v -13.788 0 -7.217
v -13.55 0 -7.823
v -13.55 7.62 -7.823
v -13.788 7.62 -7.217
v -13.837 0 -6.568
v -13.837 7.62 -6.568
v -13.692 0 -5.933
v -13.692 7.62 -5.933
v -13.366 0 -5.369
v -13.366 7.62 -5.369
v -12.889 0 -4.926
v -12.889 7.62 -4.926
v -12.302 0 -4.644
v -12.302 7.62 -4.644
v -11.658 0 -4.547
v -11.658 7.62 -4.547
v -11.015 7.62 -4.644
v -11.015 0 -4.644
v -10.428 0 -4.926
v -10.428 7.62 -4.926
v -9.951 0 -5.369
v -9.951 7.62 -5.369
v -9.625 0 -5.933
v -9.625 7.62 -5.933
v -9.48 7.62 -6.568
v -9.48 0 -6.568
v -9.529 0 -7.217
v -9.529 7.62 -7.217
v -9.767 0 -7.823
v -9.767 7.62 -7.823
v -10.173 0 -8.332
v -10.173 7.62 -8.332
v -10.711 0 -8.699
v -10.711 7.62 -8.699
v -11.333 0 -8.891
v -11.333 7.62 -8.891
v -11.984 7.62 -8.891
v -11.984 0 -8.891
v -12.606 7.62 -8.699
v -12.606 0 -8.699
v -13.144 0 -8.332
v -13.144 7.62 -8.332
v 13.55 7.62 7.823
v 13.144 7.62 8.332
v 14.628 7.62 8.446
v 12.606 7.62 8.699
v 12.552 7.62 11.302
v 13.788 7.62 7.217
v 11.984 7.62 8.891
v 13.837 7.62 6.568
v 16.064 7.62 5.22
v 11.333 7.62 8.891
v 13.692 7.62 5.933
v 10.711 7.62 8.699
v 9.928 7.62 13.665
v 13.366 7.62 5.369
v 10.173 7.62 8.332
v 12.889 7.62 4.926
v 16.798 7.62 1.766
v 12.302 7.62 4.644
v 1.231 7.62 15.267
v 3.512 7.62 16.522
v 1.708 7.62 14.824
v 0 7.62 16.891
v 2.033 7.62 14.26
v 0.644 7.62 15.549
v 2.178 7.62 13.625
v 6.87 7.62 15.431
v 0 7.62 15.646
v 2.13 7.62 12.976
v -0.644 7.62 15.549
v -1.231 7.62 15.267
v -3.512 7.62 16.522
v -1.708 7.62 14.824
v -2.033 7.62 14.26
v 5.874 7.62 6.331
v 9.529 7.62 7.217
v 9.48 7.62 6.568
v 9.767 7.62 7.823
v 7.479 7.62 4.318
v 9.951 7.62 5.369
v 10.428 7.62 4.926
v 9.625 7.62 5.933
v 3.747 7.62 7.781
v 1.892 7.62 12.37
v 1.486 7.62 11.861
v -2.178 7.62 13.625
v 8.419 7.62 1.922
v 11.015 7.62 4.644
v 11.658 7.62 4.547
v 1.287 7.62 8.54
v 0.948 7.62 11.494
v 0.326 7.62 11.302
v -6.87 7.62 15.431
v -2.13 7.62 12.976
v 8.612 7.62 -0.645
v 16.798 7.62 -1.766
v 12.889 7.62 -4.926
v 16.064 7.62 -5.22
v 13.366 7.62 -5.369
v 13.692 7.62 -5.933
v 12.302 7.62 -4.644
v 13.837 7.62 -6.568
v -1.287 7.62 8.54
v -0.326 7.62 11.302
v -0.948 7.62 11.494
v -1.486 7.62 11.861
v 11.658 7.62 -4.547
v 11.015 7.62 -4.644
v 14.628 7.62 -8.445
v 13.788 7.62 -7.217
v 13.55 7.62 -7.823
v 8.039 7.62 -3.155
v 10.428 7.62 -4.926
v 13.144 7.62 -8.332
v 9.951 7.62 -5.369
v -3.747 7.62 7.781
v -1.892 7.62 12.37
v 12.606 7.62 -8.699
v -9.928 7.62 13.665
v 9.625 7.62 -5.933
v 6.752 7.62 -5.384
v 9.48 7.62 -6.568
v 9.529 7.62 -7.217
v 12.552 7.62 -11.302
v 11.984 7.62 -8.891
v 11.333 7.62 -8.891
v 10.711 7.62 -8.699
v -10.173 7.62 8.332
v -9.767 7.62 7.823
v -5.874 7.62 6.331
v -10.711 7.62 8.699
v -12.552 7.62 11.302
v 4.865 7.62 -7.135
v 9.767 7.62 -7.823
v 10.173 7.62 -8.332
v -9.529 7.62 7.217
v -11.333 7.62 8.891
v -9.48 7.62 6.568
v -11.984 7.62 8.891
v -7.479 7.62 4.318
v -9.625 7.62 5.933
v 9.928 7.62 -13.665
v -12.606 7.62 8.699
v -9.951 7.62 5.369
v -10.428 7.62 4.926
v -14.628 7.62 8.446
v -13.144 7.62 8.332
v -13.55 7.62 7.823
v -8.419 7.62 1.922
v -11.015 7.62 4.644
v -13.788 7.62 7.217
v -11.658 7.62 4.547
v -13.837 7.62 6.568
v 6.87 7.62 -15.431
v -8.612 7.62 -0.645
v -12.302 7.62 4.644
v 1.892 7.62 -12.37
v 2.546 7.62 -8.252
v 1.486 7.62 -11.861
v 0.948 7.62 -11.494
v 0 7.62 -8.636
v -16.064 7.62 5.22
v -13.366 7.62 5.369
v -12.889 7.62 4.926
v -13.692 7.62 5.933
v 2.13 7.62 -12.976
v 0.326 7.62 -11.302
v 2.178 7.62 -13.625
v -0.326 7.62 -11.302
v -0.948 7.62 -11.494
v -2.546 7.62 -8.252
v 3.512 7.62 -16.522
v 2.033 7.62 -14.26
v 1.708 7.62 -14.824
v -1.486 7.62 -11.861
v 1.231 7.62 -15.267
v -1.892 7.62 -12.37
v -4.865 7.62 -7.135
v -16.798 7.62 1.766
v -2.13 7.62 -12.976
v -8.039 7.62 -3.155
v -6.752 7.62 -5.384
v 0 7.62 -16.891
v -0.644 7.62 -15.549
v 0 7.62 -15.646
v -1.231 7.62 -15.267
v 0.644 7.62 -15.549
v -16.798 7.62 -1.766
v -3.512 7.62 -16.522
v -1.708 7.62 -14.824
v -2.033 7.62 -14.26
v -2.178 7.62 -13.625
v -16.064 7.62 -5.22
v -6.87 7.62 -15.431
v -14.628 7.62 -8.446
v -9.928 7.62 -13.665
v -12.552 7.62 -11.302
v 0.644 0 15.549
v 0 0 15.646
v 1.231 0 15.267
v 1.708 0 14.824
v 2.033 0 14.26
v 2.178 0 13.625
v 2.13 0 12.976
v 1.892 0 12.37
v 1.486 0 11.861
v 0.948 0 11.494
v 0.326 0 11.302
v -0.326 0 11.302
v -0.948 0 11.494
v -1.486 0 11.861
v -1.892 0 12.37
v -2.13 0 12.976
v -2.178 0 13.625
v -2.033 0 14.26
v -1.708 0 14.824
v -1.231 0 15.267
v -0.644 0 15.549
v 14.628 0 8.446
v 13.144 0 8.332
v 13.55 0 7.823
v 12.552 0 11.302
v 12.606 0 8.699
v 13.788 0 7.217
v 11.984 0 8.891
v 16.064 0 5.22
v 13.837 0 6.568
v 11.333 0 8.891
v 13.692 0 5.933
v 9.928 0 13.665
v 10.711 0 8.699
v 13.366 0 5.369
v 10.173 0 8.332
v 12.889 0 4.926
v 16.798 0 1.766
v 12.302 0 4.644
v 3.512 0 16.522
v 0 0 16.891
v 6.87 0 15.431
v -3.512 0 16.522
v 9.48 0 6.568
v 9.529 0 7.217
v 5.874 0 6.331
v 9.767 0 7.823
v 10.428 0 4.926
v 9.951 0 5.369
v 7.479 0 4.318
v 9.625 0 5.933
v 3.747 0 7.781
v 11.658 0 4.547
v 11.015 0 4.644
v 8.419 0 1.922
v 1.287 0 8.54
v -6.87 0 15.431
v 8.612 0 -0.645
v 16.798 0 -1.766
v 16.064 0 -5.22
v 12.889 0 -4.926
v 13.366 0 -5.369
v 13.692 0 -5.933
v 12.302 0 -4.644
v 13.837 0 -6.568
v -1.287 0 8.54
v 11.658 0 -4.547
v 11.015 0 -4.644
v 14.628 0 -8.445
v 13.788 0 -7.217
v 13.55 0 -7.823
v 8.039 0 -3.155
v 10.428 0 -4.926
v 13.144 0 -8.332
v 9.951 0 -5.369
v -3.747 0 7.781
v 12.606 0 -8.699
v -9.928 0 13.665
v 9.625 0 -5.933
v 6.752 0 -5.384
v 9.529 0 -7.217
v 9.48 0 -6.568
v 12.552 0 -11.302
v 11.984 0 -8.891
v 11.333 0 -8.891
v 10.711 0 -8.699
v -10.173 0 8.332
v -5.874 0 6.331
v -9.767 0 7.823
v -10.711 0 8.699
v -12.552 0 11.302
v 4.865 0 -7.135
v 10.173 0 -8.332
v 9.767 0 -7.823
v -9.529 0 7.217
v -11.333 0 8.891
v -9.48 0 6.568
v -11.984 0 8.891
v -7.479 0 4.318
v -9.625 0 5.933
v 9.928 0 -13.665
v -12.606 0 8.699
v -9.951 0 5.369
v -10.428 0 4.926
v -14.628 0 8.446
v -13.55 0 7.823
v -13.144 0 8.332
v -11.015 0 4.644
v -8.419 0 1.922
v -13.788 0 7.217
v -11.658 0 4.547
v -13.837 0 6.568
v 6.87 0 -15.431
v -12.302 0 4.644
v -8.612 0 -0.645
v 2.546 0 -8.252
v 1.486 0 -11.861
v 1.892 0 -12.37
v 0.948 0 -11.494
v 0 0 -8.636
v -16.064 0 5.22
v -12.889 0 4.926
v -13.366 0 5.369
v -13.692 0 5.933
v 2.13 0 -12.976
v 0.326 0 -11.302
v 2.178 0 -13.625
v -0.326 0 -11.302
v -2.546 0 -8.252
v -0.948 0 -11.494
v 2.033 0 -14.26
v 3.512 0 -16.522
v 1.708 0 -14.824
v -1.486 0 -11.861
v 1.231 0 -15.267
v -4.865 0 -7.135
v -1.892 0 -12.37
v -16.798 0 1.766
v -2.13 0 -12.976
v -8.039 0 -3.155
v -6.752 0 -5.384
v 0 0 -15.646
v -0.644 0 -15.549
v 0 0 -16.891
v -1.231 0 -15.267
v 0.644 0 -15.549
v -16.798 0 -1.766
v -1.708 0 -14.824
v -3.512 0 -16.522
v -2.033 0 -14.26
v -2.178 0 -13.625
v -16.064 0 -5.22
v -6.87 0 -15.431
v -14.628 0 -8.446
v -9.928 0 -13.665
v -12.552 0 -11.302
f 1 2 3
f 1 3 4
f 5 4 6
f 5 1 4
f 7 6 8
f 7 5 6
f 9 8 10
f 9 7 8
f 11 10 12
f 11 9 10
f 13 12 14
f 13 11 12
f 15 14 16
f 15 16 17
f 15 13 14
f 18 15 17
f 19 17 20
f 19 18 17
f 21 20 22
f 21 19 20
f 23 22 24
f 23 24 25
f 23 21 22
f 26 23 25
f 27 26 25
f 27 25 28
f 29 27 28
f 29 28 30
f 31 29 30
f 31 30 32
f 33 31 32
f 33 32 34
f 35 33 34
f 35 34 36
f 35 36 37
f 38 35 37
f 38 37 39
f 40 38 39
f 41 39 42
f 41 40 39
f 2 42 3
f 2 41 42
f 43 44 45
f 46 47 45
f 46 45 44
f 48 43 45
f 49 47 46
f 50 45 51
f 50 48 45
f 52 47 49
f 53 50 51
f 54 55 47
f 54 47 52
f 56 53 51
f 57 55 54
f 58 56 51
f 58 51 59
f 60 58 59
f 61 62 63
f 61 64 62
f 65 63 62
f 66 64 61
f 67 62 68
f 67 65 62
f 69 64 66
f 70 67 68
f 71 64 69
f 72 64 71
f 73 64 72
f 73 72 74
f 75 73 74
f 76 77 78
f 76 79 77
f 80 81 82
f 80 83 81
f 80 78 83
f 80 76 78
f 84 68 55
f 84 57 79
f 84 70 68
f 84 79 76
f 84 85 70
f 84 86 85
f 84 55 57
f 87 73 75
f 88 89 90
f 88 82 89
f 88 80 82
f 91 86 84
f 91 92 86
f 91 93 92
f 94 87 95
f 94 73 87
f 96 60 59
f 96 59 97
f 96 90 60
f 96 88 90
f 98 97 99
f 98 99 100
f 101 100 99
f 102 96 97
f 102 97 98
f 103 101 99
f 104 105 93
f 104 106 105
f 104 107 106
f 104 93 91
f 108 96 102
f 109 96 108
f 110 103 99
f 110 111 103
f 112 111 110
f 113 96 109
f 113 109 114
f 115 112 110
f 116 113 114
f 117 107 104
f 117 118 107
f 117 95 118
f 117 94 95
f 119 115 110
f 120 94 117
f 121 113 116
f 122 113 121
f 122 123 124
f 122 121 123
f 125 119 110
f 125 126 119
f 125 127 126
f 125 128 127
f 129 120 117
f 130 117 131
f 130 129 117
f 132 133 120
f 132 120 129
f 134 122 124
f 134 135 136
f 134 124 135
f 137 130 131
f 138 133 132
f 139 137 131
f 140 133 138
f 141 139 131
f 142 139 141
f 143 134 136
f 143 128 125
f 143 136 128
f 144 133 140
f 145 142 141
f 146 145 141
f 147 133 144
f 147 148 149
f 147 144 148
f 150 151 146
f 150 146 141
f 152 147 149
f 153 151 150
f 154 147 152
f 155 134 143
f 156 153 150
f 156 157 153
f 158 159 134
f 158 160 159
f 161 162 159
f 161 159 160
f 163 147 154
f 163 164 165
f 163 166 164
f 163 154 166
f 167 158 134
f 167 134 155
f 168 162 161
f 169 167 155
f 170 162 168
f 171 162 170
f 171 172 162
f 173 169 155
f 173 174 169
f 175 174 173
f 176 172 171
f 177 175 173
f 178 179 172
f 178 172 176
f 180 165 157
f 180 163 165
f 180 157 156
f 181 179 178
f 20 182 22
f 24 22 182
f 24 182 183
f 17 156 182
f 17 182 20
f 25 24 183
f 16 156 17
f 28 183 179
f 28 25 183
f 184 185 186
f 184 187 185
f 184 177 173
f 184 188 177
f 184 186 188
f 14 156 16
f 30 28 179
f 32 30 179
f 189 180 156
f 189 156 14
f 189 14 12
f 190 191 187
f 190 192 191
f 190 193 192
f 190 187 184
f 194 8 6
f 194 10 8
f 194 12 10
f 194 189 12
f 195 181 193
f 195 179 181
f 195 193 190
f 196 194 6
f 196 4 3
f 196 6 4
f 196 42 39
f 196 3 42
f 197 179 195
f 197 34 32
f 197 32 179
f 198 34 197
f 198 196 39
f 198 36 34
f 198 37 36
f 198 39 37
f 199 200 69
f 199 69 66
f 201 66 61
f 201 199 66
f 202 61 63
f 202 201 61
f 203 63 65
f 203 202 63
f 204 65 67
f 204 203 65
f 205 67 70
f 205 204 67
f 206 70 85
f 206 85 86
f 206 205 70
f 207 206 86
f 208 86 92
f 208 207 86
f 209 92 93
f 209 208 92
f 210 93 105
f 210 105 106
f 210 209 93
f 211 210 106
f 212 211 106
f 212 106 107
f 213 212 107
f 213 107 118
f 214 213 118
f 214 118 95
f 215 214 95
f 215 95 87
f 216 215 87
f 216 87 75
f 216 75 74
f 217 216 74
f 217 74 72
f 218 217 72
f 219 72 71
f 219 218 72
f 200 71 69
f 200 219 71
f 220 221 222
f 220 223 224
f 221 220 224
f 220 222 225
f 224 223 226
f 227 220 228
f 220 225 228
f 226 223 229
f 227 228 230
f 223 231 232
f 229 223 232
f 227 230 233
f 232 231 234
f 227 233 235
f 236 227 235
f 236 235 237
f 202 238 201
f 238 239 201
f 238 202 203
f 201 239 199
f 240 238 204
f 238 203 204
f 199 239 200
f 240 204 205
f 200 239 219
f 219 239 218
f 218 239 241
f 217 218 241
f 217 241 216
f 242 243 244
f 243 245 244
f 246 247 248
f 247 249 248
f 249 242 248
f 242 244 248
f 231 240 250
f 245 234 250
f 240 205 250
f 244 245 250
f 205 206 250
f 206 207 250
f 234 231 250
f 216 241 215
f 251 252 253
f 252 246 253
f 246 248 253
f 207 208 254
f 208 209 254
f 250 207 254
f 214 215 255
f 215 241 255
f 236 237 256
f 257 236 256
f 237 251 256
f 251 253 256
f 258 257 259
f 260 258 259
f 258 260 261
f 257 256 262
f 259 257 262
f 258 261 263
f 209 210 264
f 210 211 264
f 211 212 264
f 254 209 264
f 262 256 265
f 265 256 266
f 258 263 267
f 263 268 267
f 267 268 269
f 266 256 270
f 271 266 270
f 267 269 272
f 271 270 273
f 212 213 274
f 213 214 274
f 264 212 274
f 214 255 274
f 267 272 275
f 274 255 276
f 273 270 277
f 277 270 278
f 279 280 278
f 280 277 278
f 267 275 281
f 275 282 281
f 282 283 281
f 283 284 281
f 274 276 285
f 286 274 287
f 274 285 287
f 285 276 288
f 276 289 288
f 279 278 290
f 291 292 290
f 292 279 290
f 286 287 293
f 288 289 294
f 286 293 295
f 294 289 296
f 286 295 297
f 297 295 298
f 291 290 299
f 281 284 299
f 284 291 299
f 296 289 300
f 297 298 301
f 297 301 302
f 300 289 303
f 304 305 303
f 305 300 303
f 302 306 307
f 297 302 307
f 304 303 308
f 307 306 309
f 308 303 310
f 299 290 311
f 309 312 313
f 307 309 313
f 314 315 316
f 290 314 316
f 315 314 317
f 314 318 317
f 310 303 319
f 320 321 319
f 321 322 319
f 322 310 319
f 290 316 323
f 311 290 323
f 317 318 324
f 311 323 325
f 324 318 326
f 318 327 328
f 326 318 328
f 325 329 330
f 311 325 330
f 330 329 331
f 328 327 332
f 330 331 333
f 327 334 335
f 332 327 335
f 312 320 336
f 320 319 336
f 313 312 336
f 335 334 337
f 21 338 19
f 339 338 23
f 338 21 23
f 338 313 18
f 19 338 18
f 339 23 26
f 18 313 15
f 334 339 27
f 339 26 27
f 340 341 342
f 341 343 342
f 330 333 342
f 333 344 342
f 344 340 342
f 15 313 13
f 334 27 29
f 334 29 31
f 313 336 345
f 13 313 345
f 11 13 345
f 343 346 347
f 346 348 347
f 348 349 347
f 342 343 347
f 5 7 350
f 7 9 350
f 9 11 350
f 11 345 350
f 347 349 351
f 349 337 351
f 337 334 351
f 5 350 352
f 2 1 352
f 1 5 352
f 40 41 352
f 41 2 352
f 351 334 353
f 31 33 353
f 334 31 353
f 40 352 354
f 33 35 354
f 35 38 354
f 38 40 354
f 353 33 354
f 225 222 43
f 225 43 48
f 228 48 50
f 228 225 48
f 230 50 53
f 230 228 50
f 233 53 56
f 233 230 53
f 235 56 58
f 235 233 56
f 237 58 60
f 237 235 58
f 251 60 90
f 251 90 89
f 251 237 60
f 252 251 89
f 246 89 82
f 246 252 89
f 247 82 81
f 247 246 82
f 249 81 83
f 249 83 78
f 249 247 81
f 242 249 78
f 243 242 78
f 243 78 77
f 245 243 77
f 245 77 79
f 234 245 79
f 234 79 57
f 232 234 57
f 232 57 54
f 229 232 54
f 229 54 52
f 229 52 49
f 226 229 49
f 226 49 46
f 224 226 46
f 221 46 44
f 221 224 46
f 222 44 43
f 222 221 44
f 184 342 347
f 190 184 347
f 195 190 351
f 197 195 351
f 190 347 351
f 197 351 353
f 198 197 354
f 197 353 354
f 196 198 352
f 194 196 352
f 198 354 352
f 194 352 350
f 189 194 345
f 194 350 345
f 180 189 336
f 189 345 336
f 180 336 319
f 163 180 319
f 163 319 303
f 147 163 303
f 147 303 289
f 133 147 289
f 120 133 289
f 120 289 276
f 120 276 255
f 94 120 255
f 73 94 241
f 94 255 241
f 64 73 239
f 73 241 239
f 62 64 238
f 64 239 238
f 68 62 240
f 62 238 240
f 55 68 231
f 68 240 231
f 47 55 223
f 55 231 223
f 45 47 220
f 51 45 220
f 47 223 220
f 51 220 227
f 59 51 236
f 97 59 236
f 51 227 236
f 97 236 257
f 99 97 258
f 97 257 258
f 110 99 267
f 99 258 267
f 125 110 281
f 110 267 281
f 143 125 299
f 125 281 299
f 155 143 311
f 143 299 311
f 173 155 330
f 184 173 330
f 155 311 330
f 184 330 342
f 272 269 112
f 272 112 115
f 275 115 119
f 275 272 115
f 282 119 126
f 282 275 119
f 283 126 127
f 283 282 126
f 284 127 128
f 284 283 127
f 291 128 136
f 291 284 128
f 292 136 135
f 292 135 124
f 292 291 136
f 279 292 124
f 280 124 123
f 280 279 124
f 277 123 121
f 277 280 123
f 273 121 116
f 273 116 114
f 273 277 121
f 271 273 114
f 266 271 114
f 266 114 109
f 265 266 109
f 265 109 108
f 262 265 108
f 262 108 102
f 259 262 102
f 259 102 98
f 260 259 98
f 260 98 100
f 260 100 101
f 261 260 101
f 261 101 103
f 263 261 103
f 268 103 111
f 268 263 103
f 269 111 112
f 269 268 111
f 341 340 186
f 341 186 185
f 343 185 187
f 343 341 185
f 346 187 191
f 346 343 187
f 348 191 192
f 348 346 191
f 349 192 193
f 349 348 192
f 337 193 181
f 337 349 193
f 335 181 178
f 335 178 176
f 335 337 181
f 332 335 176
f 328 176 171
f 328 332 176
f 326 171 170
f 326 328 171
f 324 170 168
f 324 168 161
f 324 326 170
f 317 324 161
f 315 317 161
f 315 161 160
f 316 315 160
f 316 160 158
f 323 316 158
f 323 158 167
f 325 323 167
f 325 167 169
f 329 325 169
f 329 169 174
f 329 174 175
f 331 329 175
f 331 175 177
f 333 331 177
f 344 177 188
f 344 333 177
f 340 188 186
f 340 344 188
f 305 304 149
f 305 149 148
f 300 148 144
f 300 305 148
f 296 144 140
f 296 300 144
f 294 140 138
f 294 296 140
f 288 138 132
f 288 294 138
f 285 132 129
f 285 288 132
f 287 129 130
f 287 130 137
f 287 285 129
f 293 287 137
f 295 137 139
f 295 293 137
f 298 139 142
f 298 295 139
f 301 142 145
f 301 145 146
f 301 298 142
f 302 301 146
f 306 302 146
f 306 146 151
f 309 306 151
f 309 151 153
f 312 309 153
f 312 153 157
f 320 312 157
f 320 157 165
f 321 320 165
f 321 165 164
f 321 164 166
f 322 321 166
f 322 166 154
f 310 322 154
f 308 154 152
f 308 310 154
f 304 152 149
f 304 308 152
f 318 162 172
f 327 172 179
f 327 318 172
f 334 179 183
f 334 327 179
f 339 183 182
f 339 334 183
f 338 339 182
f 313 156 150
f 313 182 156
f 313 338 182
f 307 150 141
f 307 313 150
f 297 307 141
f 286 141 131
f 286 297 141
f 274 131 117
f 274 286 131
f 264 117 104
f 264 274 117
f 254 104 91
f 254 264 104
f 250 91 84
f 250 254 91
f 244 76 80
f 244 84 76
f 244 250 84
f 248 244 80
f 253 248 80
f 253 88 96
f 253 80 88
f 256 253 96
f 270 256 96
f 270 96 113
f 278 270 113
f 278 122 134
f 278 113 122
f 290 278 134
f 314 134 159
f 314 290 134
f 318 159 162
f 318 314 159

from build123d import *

# Parameters (mm, degrees)
SKETCH1_R          = 16.891
EXTRUDE1_DEPTH     = 7.62
SKETCH2_R          = 8.636
CUT_EXTRUDE4_DEPTH = 26.073415443
SKETCH3_R          = 2.1844
CUT_EXTRUDE6_DEPTH = 7.62
CIRPATTERN1_COUNT  = 6


with BuildPart() as part:
    # Sketch1 → Extrude1 (new body)
    with BuildSketch(Plane(origin=(0, 0, 0), x_dir=(1, 0, 0), z_dir=(0, 1, 0))):
        Circle(SKETCH1_R)
    extrude(amount=EXTRUDE1_DEPTH)

    # Sketch2 → Cut-Extrude4 (cut, through all)
    with BuildSketch(Plane(origin=(0, 0, 0), x_dir=(1, 0, 0), z_dir=(0, 1, 0))):
        Circle(SKETCH2_R)
    extrude(amount=CUT_EXTRUDE4_DEPTH, mode=Mode.SUBTRACT)

    # Sketch3 → Cut-Extrude6 (cut)
    with BuildSketch(Plane(origin=(0, 0, 0), x_dir=(1, 0, 0), z_dir=(0, 1, 0))):
        with Locations((0, 13.462)):
            Circle(SKETCH3_R)
    cut_extrude6 = extrude(amount=CUT_EXTRUDE6_DEPTH, mode=Mode.SUBTRACT)

    # CirPattern1: Cut-Extrude6 ×6 about axis
    cirpattern1_axis = Axis((0, 17.342311411, 0), (0, -1, 0))
    for i in range(1, CIRPATTERN1_COUNT):
        add(cut_extrude6.rotate(cirpattern1_axis, i * 360 / CIRPATTERN1_COUNT), mode=Mode.SUBTRACT)


solid = part.part
